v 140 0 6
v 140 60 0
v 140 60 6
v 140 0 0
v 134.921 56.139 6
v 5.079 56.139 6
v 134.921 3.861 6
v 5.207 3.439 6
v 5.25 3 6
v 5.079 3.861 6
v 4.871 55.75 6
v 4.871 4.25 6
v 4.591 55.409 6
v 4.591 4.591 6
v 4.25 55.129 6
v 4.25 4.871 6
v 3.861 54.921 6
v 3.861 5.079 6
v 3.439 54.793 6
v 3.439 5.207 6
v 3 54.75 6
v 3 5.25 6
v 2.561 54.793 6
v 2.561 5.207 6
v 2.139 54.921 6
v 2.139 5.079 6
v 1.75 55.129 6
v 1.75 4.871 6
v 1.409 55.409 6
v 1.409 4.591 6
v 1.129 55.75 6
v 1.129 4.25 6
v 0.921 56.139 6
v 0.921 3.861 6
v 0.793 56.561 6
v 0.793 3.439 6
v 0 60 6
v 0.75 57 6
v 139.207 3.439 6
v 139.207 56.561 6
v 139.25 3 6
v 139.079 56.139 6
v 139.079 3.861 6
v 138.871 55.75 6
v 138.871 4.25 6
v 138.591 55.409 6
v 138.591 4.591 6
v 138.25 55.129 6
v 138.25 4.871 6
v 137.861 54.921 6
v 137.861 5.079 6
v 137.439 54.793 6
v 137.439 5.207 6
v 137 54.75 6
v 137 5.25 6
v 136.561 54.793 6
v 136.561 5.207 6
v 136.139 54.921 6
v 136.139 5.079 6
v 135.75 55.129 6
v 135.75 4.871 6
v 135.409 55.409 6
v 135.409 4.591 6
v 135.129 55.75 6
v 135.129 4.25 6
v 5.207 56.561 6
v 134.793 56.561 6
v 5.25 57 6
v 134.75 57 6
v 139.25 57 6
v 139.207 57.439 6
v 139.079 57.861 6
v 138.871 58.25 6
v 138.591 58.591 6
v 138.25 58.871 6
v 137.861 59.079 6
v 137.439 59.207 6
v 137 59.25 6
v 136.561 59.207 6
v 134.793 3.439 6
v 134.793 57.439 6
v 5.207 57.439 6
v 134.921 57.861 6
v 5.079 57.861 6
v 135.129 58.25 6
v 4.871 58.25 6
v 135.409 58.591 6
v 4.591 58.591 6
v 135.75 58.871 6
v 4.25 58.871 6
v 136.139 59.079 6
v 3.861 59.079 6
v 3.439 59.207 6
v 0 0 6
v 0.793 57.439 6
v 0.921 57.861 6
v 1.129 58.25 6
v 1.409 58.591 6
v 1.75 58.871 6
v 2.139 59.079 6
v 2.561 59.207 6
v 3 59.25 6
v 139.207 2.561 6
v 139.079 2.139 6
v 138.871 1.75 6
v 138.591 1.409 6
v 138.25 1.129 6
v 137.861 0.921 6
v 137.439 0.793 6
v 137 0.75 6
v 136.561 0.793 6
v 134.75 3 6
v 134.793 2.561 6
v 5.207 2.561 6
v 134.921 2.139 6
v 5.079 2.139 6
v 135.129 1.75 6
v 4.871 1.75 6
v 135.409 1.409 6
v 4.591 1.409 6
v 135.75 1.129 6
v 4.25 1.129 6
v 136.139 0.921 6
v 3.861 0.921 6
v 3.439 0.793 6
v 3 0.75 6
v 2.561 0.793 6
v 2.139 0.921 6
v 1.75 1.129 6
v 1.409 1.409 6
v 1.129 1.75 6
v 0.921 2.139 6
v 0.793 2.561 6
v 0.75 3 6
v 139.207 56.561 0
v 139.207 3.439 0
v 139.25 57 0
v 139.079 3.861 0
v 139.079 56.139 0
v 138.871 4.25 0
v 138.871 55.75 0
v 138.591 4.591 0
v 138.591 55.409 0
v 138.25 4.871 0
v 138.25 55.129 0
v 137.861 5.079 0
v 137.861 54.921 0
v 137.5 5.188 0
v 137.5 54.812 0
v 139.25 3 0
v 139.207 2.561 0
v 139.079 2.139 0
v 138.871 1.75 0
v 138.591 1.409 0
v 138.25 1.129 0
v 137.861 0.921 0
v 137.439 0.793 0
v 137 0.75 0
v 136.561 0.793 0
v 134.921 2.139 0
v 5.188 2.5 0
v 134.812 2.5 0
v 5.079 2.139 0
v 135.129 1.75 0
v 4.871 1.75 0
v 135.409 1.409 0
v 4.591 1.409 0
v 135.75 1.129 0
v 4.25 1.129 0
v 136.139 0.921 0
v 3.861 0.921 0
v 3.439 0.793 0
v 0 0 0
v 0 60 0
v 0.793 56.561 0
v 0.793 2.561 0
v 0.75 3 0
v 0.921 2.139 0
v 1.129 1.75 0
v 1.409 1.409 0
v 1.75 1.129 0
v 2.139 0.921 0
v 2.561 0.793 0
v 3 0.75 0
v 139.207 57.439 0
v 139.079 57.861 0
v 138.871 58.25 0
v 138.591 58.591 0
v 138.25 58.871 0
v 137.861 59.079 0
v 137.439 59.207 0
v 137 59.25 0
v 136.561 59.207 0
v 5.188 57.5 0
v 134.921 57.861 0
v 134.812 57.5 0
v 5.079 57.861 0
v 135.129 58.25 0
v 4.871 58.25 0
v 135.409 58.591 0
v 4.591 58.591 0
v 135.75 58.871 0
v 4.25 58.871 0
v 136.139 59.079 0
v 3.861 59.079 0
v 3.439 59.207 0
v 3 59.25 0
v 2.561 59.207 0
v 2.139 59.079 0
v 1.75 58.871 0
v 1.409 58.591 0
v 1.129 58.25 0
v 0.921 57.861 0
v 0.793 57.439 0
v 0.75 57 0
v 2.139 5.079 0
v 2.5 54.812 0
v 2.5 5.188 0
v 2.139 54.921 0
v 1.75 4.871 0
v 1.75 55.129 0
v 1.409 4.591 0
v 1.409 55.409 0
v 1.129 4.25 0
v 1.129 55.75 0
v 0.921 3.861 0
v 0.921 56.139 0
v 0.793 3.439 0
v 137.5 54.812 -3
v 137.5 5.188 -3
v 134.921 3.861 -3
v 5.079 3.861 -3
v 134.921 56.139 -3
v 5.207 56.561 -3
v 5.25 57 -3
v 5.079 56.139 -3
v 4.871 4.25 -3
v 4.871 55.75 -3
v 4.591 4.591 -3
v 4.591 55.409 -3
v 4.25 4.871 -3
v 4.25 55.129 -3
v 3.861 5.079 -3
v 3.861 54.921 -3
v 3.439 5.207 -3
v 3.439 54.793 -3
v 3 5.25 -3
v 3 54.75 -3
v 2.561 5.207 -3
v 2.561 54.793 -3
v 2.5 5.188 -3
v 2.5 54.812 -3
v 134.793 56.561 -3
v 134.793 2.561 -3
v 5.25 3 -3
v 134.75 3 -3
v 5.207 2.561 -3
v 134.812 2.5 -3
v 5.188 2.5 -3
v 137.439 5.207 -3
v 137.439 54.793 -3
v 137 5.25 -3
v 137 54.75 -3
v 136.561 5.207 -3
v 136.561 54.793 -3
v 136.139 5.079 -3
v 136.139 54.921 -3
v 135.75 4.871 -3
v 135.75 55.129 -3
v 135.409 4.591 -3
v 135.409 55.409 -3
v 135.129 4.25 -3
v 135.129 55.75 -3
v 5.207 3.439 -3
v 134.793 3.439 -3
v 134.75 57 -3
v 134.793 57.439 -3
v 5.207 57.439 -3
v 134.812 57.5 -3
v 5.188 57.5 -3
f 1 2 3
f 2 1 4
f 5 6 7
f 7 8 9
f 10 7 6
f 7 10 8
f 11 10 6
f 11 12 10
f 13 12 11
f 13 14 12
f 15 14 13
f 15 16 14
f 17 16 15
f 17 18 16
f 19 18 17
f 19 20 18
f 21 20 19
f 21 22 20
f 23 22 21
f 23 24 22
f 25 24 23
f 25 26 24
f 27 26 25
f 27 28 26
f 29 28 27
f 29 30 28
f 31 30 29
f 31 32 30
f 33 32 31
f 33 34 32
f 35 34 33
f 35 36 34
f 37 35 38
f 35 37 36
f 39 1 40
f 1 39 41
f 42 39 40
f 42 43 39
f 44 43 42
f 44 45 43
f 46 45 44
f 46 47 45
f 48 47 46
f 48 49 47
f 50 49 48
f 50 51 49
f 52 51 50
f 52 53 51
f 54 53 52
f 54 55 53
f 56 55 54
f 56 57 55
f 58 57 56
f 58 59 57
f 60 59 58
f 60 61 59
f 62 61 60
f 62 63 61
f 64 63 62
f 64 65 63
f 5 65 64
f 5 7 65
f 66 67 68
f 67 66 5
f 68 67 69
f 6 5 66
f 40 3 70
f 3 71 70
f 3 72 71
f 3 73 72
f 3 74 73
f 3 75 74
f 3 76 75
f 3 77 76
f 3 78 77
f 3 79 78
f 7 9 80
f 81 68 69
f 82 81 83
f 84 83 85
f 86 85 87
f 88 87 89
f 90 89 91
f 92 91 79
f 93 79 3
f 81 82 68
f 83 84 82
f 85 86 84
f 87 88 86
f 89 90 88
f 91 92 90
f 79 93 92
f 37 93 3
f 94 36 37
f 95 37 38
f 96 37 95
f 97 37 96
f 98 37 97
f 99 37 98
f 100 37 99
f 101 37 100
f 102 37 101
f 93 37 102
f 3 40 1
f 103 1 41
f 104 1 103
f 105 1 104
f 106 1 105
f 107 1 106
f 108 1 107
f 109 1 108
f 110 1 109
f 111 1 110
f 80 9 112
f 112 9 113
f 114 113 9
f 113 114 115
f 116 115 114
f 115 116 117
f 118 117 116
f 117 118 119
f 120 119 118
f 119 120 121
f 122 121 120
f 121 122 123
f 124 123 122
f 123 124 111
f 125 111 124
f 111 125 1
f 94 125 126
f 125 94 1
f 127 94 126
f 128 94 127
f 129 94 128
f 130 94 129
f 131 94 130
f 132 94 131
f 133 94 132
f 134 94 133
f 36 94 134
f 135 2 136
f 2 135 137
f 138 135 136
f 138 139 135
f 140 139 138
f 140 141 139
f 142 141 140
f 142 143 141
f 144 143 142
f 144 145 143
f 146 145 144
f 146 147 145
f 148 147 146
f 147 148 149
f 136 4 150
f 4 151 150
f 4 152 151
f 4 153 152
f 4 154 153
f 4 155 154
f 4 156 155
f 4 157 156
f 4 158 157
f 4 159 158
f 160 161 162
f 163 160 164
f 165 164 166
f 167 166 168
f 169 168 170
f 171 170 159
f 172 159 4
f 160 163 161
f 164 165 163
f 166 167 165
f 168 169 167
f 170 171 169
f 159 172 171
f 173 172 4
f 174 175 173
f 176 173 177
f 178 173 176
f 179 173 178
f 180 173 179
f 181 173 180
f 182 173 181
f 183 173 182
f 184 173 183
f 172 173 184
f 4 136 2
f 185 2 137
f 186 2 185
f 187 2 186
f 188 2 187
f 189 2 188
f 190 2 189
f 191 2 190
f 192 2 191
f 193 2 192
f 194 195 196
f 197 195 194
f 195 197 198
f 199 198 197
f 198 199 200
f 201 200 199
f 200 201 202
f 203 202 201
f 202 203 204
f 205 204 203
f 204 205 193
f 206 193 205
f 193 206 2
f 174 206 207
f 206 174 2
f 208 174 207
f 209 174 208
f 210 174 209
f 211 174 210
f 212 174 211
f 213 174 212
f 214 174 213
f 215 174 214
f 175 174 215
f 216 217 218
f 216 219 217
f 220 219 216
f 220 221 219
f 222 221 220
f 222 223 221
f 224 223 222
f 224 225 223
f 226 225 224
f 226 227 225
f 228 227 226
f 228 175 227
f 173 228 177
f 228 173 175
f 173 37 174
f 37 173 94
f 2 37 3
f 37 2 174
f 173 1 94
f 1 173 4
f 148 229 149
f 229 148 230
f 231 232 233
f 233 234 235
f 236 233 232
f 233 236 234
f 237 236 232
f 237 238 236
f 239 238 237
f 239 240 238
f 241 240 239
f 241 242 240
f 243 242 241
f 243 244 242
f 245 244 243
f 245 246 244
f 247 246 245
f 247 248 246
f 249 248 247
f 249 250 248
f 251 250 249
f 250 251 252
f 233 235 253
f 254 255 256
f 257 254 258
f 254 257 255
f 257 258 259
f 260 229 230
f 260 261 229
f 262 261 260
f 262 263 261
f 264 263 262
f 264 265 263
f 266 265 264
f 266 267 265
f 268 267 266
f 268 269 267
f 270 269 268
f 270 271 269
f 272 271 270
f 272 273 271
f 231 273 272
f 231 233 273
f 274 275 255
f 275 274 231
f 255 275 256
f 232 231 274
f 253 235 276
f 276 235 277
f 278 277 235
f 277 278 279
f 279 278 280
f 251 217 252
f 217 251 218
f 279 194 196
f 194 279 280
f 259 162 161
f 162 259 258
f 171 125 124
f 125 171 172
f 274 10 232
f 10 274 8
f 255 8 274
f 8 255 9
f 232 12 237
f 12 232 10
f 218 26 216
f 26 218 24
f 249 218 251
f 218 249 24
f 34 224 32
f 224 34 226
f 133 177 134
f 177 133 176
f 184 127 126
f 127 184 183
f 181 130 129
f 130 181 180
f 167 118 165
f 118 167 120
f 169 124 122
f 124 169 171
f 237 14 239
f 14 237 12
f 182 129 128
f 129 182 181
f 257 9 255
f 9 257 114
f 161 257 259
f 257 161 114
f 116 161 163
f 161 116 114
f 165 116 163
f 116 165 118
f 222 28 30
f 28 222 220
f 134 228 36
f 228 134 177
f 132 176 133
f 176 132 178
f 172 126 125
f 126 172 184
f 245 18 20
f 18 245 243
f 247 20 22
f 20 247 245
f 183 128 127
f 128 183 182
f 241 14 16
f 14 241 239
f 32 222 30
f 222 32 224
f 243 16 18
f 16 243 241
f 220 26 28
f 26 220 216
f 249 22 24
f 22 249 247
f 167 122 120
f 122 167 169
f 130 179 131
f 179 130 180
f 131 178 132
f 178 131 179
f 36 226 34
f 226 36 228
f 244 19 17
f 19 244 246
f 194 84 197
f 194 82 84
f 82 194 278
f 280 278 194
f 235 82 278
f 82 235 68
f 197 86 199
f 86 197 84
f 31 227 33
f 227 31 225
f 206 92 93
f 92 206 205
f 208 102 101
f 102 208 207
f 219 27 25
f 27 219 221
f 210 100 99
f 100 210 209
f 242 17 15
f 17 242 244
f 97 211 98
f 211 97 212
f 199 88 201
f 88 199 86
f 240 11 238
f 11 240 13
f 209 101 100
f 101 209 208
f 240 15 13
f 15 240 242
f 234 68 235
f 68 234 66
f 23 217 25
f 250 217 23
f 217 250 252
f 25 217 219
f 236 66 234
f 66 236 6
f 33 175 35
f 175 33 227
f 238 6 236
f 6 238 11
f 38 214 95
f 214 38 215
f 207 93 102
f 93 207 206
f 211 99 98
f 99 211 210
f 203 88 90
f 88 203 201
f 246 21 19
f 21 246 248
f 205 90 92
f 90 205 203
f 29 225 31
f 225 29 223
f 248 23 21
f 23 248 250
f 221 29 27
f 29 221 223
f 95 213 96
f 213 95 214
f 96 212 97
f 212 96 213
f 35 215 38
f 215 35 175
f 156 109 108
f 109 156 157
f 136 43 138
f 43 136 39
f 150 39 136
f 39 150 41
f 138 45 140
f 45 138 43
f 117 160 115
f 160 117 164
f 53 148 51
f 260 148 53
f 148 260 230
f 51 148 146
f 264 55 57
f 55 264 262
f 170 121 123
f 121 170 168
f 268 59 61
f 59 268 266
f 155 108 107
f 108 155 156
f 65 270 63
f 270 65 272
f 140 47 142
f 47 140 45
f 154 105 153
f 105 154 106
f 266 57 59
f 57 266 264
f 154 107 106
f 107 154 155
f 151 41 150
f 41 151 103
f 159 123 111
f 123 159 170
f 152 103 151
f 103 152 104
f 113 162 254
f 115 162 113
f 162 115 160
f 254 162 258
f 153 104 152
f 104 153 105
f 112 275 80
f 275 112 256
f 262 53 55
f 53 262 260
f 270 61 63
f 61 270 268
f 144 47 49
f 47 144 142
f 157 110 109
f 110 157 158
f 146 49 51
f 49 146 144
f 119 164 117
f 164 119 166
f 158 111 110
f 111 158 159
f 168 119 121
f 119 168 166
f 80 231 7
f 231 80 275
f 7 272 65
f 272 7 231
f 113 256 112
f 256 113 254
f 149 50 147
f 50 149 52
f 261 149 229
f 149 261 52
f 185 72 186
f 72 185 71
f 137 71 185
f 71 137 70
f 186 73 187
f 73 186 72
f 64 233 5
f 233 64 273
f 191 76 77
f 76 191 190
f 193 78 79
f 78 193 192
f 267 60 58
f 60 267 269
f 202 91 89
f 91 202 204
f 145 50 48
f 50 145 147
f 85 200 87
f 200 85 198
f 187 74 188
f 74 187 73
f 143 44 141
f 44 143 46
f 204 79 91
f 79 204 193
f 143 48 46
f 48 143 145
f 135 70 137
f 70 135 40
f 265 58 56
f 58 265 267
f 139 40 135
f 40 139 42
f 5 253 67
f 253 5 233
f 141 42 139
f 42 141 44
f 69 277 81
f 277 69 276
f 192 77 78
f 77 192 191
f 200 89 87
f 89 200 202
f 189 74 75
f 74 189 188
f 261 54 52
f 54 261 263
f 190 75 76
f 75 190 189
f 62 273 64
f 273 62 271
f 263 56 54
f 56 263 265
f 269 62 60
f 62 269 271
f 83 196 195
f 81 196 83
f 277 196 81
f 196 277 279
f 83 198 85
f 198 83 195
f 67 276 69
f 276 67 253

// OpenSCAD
$fn = 32;

// ----------------------------------------------------------------------
// Enclosure lid: 140 x 60 x 6 mm, 4 bolt holes
// ----------------------------------------------------------------------

// --- parameters (mm) ---
length = 140;             // lid length, X
width = 60;               // lid width, Y
plate_t = 6;              // lid plate thickness
bolt_d = 4.5;             // bolt clearance
boss_lip = 3;             // bolt hole inset from the corner
sink = 1;                 // overlap of the lip and ribs into the plate
lip_h = 4;                // lip height below the plate
lip_wall = 2.5;           // lip wall thickness

module plate() {
  cube([length, width, plate_t]);
  /* lip that drops into the housing opening, sunk into the plate */
  translate([lip_wall, lip_wall, -lip_h + sink]) cube([length - 2 * lip_wall, width - 2 * lip_wall, lip_h]);
}

difference() {
  plate();
  /* bolt pattern matching the corner bosses */
  for (sx = [0, 1]) for (sy = [0, 1])
    translate([sx * (length - 2 * boss_lip) + boss_lip, sy * (width - 2 * boss_lip) + boss_lip, -lip_h - 1])
      cylinder(h = plate_t + lip_h + 2, d = bolt_d);
}
